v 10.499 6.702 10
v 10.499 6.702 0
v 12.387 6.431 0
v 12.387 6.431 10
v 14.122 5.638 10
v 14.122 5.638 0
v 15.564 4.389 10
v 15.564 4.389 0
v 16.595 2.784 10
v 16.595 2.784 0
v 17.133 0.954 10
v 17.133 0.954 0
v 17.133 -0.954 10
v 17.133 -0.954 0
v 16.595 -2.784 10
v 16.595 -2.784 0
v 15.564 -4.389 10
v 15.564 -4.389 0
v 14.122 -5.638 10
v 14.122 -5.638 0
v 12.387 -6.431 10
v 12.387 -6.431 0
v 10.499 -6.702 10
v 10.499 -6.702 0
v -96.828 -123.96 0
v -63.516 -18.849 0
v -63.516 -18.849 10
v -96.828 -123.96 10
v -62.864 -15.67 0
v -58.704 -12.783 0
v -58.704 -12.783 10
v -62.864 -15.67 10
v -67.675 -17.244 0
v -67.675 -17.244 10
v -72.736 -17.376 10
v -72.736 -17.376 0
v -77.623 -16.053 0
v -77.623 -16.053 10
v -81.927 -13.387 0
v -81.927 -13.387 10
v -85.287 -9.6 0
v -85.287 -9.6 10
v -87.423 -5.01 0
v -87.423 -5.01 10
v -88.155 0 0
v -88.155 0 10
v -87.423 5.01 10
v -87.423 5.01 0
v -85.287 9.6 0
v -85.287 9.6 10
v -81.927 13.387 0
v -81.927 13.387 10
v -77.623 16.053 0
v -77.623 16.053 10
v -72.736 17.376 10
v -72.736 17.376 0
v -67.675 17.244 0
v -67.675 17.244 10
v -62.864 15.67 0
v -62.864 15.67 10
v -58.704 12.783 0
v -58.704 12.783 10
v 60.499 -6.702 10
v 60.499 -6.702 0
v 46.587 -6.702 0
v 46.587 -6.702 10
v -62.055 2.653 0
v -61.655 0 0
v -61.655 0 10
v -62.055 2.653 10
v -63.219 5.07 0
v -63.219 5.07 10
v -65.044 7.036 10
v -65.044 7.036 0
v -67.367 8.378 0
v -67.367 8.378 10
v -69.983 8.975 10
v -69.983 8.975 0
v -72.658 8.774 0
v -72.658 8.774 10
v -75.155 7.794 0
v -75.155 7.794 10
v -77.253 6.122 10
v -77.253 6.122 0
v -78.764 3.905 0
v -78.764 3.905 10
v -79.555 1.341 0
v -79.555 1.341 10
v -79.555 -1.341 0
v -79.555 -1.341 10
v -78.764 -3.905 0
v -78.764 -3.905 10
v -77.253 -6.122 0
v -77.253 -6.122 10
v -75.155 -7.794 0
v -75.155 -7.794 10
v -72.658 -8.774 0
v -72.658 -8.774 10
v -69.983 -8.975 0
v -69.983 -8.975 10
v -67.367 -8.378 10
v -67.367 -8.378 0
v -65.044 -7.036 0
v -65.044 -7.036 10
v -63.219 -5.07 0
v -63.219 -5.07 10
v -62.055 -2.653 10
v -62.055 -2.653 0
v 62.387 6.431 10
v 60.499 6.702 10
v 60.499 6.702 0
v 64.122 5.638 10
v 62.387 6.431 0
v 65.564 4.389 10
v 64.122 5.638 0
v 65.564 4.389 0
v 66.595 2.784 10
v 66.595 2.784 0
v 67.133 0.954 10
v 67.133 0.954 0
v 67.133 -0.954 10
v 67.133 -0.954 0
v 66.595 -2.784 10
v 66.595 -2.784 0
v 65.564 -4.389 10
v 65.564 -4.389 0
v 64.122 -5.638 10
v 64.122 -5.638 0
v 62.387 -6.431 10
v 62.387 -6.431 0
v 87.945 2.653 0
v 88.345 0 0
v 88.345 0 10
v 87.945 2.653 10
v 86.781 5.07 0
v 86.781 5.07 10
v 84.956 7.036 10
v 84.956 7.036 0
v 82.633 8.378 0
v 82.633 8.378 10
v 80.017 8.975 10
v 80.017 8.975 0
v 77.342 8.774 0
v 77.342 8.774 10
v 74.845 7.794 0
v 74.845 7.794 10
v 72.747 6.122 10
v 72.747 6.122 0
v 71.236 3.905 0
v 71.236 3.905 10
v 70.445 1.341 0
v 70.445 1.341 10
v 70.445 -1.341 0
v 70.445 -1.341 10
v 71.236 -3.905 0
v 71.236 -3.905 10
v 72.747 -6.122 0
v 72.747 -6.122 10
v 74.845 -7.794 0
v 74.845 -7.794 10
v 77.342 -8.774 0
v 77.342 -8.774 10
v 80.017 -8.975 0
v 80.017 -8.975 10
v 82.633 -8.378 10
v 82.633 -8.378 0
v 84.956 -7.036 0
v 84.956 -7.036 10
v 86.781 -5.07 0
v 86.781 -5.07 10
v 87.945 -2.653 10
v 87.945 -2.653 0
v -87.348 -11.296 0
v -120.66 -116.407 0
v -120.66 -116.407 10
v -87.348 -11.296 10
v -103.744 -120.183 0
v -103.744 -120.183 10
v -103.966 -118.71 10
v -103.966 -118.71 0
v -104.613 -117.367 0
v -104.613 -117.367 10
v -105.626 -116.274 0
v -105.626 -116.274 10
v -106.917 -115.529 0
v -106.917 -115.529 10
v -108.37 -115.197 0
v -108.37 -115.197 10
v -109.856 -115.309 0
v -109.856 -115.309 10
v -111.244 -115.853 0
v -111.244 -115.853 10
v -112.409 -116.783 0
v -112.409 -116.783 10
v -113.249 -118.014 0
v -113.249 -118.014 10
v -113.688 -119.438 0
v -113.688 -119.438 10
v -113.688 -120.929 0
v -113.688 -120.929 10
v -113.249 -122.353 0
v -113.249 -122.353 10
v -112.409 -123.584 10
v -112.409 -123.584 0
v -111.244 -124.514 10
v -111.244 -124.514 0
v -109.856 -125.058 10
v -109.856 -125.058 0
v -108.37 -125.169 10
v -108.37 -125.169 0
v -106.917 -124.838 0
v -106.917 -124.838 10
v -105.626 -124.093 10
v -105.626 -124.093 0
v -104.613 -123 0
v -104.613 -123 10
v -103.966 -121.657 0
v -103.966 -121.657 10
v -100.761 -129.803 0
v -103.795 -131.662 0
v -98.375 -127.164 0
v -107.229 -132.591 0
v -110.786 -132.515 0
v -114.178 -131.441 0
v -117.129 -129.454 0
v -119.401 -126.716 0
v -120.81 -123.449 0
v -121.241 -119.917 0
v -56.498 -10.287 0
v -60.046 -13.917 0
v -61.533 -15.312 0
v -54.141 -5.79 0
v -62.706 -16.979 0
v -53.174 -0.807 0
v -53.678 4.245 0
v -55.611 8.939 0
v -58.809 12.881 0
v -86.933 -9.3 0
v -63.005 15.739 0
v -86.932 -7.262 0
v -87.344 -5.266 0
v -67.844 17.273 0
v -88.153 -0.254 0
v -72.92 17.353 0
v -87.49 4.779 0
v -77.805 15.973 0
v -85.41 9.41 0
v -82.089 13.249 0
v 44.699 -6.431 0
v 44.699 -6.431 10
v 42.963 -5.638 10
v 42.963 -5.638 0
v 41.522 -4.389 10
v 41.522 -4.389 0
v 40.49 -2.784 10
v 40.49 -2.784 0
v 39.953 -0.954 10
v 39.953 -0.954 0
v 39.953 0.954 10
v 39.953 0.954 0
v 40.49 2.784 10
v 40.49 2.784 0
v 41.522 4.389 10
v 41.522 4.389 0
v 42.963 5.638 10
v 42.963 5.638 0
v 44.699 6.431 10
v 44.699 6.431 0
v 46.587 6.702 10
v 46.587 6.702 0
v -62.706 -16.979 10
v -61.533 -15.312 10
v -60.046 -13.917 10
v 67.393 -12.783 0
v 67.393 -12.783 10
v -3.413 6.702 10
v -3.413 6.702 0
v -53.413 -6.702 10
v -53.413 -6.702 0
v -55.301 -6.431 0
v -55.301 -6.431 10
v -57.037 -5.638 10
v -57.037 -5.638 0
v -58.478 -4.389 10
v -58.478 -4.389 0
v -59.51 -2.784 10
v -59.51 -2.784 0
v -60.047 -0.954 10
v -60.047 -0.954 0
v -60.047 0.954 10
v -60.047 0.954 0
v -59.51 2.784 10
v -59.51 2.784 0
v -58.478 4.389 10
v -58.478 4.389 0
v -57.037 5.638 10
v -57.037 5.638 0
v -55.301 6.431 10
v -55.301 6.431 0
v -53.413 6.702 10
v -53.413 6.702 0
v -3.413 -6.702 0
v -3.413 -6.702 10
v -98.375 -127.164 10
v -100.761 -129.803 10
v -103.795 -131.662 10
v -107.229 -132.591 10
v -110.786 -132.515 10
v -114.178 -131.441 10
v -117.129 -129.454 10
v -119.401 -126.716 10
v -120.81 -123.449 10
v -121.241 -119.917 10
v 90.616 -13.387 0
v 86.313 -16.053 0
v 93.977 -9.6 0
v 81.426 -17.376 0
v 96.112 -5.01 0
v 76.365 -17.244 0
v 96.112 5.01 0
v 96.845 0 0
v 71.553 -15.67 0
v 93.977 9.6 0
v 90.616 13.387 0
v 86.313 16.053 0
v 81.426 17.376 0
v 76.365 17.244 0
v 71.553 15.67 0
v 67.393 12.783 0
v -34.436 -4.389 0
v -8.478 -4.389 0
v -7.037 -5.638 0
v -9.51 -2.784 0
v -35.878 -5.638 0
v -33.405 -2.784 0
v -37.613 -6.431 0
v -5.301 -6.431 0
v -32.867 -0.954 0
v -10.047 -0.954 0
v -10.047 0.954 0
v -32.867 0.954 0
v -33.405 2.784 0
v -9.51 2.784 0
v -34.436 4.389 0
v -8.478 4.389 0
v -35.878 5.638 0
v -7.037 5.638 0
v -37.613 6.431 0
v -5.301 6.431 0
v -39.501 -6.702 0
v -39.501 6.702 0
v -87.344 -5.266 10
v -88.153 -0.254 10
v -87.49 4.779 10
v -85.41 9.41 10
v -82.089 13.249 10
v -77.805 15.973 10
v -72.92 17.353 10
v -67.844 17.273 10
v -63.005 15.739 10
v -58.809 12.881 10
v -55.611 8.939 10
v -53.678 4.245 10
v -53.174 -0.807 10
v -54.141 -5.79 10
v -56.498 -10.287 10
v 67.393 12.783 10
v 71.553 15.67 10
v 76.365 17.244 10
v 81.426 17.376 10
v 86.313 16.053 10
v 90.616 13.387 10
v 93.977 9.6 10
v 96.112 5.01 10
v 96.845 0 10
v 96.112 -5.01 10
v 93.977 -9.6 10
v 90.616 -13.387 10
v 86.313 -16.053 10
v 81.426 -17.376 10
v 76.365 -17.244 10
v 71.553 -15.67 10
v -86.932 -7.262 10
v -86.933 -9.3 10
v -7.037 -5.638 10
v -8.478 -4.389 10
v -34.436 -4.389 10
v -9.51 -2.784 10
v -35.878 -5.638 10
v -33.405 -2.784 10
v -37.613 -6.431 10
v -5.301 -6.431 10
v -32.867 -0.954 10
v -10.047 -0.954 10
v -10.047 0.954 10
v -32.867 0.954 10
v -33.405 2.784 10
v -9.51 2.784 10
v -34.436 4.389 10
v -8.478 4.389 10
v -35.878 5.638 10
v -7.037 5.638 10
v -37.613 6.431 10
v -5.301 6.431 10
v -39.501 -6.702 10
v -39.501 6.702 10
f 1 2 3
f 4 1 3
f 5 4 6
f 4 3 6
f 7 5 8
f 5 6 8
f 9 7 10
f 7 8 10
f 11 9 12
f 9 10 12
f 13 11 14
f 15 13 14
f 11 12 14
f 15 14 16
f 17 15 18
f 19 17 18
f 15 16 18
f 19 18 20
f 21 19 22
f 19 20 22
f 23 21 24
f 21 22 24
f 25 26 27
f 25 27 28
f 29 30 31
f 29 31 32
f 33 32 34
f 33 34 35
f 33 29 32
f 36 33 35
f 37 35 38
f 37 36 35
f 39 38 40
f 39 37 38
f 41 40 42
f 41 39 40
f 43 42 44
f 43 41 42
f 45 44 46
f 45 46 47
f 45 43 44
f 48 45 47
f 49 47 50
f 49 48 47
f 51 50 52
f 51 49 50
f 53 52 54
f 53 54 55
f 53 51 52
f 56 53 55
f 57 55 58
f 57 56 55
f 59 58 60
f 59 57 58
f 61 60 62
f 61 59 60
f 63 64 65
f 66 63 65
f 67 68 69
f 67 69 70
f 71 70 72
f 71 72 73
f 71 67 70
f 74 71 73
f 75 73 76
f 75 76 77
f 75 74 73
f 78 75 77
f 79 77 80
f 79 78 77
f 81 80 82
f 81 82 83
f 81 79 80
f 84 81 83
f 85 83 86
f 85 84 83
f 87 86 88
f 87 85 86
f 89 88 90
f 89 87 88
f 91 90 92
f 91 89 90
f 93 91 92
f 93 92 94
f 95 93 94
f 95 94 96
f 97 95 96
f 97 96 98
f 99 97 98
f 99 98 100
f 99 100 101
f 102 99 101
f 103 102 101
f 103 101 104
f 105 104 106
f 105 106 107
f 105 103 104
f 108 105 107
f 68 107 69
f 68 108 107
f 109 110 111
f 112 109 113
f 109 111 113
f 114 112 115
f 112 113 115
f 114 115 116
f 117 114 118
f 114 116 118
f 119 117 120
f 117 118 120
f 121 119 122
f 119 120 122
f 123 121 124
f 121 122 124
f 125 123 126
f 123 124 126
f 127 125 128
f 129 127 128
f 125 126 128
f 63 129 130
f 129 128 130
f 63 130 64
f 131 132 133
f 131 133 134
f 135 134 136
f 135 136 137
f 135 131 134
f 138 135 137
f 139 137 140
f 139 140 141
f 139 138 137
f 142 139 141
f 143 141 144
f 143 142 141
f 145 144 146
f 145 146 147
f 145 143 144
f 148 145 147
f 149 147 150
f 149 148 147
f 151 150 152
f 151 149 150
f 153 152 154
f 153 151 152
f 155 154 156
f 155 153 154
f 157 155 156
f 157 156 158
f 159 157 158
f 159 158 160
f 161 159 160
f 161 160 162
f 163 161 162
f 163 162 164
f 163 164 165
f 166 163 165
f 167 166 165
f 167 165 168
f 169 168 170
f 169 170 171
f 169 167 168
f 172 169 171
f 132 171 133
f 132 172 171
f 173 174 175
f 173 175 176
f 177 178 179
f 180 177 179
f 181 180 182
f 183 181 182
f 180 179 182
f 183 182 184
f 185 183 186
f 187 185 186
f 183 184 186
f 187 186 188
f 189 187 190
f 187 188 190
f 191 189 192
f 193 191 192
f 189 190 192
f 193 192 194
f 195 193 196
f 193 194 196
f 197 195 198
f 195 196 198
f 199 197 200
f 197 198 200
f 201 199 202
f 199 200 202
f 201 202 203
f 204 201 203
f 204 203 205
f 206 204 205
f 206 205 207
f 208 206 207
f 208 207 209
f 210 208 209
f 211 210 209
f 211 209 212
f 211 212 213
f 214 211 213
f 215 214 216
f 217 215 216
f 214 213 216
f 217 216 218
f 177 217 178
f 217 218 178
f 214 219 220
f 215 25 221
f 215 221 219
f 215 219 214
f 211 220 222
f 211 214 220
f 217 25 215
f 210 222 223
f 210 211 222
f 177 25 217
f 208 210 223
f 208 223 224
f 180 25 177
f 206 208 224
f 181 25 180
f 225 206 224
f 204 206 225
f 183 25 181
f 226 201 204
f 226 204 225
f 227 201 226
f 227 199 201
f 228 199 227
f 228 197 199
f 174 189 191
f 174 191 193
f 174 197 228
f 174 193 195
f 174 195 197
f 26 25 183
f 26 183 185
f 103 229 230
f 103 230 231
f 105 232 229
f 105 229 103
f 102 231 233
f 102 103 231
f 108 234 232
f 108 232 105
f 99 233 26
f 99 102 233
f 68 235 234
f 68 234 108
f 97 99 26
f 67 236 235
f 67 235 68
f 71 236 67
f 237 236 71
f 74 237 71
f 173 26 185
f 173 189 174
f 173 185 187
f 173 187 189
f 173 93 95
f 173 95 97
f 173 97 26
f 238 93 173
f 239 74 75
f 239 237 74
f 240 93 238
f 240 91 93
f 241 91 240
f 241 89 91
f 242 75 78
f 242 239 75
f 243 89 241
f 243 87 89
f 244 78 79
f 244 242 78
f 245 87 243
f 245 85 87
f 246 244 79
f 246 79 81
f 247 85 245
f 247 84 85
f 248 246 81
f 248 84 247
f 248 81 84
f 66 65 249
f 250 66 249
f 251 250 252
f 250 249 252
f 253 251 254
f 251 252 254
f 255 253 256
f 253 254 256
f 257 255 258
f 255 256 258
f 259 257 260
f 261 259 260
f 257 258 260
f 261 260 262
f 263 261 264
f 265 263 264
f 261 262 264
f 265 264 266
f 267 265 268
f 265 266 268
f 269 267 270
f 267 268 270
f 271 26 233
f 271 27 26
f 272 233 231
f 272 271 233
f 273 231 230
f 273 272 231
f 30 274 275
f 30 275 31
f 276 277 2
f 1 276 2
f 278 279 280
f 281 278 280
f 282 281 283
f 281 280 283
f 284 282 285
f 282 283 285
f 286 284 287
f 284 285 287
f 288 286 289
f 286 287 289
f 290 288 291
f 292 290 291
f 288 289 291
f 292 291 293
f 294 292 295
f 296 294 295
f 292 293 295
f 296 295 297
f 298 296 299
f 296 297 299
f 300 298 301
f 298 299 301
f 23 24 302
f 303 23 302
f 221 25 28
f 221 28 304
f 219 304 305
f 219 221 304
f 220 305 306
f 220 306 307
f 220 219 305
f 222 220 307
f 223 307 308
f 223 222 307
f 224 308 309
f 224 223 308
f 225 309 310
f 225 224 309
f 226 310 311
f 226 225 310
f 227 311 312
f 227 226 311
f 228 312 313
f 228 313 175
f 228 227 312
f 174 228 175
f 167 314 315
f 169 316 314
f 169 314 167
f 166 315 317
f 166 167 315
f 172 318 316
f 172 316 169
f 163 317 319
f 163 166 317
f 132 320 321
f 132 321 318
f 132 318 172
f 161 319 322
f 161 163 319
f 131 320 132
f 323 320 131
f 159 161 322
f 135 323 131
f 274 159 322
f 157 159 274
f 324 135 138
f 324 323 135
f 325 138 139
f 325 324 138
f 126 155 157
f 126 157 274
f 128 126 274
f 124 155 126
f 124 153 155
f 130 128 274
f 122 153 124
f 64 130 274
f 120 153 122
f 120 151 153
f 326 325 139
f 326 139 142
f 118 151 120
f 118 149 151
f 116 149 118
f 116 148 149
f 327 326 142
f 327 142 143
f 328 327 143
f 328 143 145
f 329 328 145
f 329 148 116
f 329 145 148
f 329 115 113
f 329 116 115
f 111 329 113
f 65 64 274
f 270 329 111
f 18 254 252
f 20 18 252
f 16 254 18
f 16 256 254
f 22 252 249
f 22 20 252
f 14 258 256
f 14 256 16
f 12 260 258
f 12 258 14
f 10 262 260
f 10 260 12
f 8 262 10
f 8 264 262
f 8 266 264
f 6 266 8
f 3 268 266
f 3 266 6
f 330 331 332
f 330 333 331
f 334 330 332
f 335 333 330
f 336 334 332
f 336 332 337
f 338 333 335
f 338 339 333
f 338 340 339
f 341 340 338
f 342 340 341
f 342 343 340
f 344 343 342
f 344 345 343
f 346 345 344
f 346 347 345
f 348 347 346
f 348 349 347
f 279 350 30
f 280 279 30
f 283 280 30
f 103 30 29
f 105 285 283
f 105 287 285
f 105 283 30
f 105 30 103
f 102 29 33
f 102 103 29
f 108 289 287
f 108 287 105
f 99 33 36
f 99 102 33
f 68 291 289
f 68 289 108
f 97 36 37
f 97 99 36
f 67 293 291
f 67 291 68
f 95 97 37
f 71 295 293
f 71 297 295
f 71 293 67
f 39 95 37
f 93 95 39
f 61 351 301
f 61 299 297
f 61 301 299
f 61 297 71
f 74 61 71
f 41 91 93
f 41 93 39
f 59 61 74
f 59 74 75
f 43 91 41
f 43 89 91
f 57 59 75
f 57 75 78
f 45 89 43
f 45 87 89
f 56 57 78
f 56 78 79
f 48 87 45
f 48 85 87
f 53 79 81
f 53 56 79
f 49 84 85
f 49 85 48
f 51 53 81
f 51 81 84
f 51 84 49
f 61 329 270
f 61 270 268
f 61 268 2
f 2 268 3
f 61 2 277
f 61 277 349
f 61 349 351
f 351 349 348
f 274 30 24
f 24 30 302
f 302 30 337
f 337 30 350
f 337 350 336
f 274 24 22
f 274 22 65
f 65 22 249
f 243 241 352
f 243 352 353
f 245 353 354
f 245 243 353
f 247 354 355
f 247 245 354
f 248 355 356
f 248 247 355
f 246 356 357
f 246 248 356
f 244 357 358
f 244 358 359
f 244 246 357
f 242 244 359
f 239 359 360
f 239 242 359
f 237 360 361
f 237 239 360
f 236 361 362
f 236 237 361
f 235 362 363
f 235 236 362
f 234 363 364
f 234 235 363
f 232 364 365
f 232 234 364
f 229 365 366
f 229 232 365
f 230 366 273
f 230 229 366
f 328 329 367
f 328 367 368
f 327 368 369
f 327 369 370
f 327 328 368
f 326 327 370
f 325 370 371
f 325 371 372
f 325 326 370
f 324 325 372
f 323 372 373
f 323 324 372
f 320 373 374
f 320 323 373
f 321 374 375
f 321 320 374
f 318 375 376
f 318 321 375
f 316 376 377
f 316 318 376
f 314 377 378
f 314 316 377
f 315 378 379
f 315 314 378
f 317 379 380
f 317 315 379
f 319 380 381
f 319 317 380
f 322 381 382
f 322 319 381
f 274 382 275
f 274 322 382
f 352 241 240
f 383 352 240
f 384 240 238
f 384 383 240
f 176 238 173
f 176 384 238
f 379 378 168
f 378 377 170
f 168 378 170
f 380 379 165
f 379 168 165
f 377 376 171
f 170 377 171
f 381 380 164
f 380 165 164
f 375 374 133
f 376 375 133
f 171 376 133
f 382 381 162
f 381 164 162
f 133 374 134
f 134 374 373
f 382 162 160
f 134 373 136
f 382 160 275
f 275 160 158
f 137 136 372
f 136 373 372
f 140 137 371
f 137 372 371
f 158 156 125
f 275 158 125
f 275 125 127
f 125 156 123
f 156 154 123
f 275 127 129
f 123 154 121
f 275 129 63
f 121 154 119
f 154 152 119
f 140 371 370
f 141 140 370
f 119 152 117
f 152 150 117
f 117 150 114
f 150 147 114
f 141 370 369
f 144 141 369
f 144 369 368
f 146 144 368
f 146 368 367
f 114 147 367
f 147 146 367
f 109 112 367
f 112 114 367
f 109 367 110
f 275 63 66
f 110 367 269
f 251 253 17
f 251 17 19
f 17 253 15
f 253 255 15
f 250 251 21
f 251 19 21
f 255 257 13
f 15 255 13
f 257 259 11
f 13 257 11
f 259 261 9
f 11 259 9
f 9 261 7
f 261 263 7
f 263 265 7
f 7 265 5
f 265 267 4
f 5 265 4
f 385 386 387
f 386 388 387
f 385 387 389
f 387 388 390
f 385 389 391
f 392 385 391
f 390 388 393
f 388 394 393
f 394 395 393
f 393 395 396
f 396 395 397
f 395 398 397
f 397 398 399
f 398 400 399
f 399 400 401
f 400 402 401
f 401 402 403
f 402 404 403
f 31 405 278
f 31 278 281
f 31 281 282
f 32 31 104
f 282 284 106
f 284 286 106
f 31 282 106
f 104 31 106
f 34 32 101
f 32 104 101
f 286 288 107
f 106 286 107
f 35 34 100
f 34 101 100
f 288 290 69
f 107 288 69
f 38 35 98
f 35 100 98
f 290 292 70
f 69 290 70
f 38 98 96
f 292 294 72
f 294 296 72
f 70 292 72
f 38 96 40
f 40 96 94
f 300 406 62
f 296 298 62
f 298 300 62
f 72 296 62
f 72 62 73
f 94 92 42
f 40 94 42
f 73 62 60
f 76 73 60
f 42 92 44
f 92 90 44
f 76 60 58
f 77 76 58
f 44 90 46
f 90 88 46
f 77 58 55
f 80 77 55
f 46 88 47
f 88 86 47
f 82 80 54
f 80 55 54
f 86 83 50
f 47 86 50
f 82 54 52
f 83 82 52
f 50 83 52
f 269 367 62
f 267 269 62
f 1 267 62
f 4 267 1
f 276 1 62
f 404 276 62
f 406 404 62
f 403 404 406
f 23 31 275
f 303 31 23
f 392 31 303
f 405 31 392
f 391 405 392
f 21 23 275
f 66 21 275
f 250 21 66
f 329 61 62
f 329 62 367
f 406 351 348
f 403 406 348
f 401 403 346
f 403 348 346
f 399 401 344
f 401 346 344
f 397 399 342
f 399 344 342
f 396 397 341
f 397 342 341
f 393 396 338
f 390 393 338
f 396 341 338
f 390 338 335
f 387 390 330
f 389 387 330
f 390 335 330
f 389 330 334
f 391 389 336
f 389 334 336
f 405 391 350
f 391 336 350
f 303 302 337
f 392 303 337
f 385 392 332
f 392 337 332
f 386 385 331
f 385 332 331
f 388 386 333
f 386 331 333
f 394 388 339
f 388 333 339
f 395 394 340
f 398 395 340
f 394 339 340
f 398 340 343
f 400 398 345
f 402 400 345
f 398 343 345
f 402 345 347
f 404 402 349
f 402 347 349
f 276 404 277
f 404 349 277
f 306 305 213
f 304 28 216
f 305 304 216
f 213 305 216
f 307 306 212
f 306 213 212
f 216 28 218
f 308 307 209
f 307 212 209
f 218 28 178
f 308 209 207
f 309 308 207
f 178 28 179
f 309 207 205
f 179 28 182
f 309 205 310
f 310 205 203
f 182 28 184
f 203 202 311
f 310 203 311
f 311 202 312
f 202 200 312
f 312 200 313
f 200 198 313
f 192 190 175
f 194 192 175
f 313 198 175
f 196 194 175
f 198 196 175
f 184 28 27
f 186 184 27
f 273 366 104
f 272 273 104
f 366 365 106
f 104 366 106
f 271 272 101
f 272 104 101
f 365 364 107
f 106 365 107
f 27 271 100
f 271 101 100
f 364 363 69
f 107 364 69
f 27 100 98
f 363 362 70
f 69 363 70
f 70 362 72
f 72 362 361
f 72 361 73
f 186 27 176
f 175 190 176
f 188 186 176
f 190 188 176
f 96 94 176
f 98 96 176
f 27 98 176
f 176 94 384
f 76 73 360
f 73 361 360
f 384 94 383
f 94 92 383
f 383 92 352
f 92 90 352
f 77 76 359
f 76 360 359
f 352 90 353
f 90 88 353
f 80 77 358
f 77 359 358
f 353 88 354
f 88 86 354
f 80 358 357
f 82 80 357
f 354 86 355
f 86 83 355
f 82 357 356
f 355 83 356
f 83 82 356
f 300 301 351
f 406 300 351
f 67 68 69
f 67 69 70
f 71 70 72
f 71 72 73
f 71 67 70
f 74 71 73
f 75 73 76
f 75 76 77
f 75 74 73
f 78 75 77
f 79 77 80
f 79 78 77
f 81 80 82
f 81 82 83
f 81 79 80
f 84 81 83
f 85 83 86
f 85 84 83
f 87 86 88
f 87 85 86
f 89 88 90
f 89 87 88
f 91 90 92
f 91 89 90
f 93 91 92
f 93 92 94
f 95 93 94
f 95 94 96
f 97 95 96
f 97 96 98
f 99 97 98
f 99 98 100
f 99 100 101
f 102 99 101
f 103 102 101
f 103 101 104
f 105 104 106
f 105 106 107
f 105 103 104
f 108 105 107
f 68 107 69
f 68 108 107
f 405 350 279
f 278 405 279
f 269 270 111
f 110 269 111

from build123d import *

# Parameters (mm, degrees)
SKETCH1_R           = 9
BOSS_EXTRUDE3_DEPTH = 10
SKETCH2_R           = 9
BOSS_EXTRUDE2_DEPTH = 10
SKETCH3_R           = 5
CUT_EXTRUDE1_DEPTH  = 10
FILLET1_R           = 10


with BuildPart() as part:
    # Sketch1 → Boss-Extrude3 (new body)
    with BuildSketch(Plane.XY):
        with BuildLine():
            Line((-58.704034486, 12.783450444), (67.393380319, 12.783450444))
            ThreePointArc((67.393380319, 12.783450444), (96.844672917, 0), (67.393380319, -12.783450444))
            Line((67.393380319, -12.783450444), (-58.704034486, -12.783450444))
            ThreePointArc((-58.704034486, -12.783450444), (-88.155327083, 0), (-58.704034486, 12.783450444))
        make_face()
        with Locations((-70.655327083, 0)):
            Circle(SKETCH1_R, mode=Mode.SUBTRACT)
        with Locations((79.344672917, 0)):
            Circle(SKETCH1_R, mode=Mode.SUBTRACT)
        with BuildLine():
            Line((-53.412978839, 6.702415671), (-39.501397037, 6.702415671))
            ThreePointArc((-39.501397037, 6.702415671), (-32.798981366, 0), (-39.501397037, -6.702415671))
            Line((-39.501397037, -6.702415671), (-53.412978839, -6.702415671))
            ThreePointArc((-53.412978839, -6.702415671), (-60.11539451, 0), (-53.412978839, 6.702415671))
        make_face(mode=Mode.SUBTRACT)
        with BuildLine():
            Line((-3.412978839, 6.702415671), (10.498602963, 6.702415671))
            ThreePointArc((10.498602963, 6.702415671), (17.201018634, 0), (10.498602963, -6.702415671))
            Line((10.498602963, -6.702415671), (-3.412978839, -6.702415671))
            ThreePointArc((-3.412978839, -6.702415671), (-10.11539451, 0), (-3.412978839, 6.702415671))
        make_face(mode=Mode.SUBTRACT)
        with BuildLine():
            Line((46.587021161, 6.702415671), (60.498602963, 6.702415671))
            ThreePointArc((60.498602963, 6.702415671), (67.201018634, 0), (60.498602963, -6.702415671))
            Line((60.498602963, -6.702415671), (46.587021161, -6.702415671))
            ThreePointArc((46.587021161, -6.702415671), (39.88460549, 0), (46.587021161, 6.702415671))
        make_face(mode=Mode.SUBTRACT)
    extrude(amount=BOSS_EXTRUDE3_DEPTH)


with BuildPart() as body_2:
    # Sketch2 → Boss-Extrude2 (new body)
    with BuildSketch(Plane.XY):
        with BuildLine():
            Line((-62.439507531, -15.451547142), (-96.827928866, -123.959805763))
            ThreePointArc((-96.827928866, -123.959805763), (-112.520226263, -132.09932678), (-120.65974728, -116.407029382))
            Line((-120.65974728, -116.407029382), (-86.271325945, -7.898770761))
            ThreePointArc((-86.271325945, -7.898770761), (-65.368383617, 16.68227289), (-62.439507531, -15.451547142))
        make_face()
        with Locations((-70.655327083, 0)):
            Circle(SKETCH2_R, mode=Mode.SUBTRACT)
    extrude(amount=BOSS_EXTRUDE2_DEPTH)

    # Sketch3 → Cut-Extrude1 (cut)
    with BuildSketch(Plane.XY.offset(10)):
        with Locations((-108.743838073, -120.183417573)):
            Circle(SKETCH3_R)
    extrude(amount=-CUT_EXTRUDE1_DEPTH, mode=Mode.SUBTRACT)

    # Fillet1
    fillet1_edges = [body_2.edges().sort_by_distance(p)[0] for p in [
        (-86.271325945, -7.898770761, 5),
        (-62.439507531, -15.451547142, 5),
    ]]
    fillet(fillet1_edges, radius=FILLET1_R)


solid = Compound([part.part, body_2.part])
